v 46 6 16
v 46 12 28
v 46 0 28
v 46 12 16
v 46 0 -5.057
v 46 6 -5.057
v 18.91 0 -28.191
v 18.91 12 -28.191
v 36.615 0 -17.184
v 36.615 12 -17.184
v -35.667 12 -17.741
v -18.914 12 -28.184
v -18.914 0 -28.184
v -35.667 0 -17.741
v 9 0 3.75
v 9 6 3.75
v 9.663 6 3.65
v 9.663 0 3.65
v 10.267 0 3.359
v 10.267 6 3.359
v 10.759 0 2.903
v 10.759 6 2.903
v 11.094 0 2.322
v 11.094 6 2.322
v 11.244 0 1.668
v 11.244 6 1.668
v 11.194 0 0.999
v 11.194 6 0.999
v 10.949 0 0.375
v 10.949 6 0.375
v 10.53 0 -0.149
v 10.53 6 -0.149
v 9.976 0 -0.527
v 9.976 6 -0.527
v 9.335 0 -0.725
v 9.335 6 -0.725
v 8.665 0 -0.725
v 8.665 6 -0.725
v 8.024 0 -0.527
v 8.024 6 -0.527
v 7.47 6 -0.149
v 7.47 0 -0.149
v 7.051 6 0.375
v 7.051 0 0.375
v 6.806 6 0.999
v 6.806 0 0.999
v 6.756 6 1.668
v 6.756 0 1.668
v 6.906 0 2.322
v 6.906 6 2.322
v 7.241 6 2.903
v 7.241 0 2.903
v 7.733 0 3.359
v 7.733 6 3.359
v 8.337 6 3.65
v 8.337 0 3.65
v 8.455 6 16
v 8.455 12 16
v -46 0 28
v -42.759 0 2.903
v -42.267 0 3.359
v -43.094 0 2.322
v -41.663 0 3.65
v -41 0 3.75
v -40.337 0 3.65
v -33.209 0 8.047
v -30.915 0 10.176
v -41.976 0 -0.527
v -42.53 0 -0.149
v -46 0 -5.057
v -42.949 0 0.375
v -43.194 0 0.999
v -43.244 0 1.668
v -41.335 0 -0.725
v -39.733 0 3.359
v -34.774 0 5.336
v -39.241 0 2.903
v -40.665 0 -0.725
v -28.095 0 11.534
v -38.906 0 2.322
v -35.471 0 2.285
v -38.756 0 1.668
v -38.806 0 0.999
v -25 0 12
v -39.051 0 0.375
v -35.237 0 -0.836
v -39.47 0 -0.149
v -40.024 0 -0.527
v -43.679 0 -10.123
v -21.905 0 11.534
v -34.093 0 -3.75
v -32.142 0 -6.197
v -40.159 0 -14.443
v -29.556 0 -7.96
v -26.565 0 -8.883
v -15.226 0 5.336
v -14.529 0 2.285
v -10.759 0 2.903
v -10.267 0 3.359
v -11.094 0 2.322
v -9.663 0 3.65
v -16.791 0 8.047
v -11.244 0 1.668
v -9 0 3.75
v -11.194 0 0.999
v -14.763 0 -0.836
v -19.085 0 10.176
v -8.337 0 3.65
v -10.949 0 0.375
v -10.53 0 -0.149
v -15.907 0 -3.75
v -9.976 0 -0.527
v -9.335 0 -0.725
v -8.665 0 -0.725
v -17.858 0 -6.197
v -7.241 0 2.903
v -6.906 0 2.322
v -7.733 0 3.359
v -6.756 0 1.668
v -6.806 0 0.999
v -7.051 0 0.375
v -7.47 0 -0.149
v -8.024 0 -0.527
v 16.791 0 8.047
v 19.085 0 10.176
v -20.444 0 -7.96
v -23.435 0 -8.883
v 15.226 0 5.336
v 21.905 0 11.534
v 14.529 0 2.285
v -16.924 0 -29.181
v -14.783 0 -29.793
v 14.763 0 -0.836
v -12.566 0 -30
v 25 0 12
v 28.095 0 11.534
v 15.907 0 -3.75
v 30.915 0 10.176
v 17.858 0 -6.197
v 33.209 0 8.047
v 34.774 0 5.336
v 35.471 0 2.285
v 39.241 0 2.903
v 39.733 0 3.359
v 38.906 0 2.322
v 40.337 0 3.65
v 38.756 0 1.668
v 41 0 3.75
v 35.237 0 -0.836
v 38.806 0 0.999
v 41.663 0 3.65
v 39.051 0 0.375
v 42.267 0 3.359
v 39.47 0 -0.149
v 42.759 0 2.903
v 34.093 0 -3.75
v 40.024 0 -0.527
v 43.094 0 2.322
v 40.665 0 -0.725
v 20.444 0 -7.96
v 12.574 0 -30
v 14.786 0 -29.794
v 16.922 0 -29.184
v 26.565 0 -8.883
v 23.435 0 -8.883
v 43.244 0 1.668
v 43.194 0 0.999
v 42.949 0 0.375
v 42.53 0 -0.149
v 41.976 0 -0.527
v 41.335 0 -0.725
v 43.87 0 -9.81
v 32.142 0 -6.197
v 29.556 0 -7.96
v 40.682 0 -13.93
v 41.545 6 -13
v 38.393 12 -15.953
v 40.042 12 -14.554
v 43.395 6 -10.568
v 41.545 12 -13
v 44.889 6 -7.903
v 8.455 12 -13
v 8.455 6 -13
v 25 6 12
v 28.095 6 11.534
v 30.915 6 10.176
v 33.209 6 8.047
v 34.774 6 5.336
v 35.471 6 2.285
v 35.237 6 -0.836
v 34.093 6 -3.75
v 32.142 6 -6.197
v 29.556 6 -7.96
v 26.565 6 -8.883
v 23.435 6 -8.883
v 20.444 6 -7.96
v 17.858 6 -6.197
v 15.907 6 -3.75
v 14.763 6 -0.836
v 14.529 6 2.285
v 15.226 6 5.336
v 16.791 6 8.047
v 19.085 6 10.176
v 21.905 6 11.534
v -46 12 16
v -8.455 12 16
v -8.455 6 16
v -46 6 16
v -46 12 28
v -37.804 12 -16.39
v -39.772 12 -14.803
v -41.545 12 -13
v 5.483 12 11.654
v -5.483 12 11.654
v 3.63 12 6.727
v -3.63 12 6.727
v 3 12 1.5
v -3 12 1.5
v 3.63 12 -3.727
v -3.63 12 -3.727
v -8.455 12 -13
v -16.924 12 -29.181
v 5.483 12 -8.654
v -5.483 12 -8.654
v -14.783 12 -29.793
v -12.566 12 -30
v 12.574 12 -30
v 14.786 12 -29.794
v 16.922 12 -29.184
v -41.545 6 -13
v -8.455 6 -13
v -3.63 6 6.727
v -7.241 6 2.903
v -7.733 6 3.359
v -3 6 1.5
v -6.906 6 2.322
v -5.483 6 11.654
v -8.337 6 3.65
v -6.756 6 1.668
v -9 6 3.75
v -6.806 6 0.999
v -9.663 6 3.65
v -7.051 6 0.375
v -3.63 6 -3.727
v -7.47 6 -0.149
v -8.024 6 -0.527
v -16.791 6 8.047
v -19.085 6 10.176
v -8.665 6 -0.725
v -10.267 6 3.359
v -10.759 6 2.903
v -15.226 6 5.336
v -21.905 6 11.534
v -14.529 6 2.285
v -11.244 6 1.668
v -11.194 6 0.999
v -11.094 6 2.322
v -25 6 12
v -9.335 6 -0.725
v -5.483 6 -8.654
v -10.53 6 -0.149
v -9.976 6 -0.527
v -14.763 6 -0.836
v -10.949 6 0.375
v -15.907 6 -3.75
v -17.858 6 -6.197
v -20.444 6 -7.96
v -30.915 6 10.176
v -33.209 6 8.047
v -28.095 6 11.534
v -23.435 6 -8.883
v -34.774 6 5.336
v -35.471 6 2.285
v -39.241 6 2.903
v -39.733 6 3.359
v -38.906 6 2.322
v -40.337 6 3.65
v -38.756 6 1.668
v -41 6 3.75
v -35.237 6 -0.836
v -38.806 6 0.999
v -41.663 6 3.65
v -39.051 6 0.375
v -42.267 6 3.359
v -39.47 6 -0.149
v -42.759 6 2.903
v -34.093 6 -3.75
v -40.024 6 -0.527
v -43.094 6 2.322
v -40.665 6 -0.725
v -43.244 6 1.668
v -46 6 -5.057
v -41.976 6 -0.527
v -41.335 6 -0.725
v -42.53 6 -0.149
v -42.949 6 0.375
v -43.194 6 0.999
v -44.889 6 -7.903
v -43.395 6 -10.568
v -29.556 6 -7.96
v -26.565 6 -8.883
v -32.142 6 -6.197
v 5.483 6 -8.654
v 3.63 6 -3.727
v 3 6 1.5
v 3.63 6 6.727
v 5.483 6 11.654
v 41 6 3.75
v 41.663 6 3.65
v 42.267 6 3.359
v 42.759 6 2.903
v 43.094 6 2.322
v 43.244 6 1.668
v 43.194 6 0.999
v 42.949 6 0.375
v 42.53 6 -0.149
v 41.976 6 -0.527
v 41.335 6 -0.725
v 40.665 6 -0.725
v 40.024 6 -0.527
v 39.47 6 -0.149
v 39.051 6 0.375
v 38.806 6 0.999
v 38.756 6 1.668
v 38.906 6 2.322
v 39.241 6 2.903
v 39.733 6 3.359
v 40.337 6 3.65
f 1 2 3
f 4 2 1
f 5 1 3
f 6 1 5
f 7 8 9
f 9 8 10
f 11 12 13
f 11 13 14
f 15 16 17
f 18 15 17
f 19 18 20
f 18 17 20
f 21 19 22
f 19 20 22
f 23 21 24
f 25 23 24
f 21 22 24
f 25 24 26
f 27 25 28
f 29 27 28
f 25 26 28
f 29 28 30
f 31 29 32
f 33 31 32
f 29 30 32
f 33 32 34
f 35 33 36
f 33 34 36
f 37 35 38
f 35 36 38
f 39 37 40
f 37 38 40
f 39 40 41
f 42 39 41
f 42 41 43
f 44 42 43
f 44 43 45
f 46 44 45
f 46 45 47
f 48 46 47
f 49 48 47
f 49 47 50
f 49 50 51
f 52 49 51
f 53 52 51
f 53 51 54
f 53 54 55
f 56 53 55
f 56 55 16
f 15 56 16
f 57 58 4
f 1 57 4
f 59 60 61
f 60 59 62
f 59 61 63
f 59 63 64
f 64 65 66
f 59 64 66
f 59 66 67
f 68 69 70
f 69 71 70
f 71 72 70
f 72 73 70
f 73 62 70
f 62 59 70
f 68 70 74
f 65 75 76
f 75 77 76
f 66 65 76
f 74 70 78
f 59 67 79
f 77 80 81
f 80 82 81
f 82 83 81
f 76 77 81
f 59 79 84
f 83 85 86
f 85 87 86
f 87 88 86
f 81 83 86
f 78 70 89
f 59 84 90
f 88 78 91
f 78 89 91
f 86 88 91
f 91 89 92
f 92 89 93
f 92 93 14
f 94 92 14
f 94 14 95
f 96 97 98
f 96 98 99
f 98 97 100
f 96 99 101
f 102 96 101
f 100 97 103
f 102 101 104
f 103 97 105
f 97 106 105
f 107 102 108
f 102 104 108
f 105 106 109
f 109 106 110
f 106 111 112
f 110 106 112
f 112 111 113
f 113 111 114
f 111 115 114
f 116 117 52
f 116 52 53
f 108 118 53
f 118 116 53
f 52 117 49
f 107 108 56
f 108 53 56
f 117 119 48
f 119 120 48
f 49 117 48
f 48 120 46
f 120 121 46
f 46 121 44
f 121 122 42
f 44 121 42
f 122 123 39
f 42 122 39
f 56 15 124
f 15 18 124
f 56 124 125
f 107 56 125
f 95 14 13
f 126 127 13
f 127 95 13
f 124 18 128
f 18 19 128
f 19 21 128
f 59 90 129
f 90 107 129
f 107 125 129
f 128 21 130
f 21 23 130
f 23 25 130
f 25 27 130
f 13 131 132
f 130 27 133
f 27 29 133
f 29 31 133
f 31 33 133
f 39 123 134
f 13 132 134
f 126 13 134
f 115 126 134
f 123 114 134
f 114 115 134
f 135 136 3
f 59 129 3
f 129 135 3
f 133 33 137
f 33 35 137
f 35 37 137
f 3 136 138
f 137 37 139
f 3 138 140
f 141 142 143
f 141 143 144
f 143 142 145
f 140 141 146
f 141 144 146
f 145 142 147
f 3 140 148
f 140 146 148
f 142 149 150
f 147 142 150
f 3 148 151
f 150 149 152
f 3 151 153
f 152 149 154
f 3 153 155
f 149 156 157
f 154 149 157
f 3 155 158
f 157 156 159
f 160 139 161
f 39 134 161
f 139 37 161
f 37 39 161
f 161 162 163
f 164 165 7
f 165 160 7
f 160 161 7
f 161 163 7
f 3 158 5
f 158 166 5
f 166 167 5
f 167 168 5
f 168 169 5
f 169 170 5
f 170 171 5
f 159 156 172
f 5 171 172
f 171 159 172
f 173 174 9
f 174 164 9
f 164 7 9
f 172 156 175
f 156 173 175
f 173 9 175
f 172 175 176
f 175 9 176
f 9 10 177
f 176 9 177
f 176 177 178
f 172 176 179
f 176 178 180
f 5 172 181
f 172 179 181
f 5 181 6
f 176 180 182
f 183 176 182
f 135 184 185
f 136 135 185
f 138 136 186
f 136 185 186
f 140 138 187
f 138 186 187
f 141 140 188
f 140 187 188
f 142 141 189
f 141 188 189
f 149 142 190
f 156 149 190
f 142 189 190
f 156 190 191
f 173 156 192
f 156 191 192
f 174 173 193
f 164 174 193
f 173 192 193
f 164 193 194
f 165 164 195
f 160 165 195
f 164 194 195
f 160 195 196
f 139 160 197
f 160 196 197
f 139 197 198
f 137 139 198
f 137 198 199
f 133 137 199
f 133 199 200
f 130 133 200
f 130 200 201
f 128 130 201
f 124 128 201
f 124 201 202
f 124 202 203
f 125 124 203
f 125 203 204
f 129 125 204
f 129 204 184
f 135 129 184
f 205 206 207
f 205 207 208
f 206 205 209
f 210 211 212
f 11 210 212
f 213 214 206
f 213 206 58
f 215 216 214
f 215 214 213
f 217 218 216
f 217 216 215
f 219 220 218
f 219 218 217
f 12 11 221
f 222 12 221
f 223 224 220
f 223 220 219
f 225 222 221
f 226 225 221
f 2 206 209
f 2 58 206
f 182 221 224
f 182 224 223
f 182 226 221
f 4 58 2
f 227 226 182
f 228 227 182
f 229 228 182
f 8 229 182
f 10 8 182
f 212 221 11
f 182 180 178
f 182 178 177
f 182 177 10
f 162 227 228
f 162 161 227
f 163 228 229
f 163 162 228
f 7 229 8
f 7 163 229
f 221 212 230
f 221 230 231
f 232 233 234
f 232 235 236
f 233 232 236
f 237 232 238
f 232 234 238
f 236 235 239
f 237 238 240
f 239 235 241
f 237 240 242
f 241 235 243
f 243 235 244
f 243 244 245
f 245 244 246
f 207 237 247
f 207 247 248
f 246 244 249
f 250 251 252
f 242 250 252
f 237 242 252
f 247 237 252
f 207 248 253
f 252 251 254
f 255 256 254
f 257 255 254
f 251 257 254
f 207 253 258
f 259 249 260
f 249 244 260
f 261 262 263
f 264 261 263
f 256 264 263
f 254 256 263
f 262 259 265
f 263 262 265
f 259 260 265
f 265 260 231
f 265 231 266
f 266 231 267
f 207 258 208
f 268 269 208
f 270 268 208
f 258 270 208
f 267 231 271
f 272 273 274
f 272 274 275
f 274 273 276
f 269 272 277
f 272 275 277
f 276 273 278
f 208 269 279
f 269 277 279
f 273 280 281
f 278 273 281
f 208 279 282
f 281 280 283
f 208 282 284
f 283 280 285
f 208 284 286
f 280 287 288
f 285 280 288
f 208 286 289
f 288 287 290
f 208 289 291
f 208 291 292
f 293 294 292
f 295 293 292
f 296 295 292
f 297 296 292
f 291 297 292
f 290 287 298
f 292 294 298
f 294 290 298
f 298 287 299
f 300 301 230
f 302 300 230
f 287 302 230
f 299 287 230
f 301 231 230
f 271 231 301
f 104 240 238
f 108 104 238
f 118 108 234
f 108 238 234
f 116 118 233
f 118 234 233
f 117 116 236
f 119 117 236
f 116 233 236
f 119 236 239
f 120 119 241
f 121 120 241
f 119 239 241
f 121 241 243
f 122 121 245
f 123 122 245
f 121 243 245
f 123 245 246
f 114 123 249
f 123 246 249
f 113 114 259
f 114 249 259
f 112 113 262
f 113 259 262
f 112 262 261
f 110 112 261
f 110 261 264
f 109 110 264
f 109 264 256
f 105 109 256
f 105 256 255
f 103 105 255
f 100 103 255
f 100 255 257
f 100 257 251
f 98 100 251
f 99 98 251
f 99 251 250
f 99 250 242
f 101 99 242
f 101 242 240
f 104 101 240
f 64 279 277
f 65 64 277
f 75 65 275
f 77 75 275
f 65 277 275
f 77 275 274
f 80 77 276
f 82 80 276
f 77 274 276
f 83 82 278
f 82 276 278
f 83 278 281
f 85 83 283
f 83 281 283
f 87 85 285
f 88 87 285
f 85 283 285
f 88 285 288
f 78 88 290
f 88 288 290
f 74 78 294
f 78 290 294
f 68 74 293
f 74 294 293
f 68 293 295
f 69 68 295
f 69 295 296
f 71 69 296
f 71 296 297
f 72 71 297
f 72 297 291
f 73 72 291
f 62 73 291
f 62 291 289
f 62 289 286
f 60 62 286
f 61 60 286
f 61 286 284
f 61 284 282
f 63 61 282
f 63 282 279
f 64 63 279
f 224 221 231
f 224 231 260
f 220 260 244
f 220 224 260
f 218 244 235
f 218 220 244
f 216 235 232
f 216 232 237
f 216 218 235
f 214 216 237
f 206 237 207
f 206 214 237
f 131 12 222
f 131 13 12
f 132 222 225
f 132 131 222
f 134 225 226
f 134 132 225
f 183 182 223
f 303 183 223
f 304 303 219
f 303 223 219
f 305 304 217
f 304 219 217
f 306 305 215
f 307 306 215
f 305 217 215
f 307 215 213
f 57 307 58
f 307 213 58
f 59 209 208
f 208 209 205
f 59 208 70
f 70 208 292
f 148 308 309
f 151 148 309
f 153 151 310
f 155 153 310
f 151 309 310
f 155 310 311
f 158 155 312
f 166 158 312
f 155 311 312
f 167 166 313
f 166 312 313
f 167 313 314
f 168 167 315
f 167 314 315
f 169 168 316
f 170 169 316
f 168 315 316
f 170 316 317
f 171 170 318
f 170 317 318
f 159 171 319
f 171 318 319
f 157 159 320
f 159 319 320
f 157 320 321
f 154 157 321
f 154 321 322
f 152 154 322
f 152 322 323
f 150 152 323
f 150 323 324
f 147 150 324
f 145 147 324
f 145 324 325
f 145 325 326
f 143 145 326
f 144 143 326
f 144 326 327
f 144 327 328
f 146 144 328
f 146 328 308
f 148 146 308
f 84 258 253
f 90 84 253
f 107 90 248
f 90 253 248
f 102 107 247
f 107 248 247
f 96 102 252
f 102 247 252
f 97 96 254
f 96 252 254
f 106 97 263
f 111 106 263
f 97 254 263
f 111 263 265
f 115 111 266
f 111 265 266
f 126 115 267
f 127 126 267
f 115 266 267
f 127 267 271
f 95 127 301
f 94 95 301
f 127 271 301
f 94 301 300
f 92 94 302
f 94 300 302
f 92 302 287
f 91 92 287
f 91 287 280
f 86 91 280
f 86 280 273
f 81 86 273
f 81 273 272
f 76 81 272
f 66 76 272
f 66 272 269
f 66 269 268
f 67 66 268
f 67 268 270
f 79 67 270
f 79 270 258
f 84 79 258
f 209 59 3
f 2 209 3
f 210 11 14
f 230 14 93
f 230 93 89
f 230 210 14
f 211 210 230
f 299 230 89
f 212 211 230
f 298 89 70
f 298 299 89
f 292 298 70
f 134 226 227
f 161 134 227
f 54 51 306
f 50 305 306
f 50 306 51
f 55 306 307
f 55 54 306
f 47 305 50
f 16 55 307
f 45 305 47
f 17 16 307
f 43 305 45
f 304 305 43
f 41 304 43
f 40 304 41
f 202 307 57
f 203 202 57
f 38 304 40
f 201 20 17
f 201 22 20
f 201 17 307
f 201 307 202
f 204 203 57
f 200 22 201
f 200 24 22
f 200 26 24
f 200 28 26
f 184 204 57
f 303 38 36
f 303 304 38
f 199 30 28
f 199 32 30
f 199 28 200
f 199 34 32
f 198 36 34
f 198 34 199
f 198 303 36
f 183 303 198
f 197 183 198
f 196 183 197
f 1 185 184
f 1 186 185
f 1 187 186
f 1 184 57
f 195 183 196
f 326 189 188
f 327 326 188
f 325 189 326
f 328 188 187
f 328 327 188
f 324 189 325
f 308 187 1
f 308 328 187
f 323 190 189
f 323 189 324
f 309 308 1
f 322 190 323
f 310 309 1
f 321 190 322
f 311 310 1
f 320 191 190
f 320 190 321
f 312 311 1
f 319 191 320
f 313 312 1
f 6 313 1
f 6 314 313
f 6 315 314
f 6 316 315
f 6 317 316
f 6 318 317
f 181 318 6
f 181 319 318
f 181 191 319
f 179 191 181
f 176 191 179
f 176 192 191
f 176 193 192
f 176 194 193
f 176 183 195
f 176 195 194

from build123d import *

# Parameters (mm, degrees)
SKETCH1_W           = 92
SKETCH1_H           = 56
BOSS_EXTRUDE1_DEPTH = 12
SKETCH8_W           = 92
SKETCH8_H           = 2
BOSS_EXTRUDE3_DEPTH = 12
CUT_EXTRUDE1_REACH  = 58.214
SKETCH2_R           = 10.5
CUT_EXTRUDE3_DEPTH  = 6
CUT_EXTRUDE4_REACH  = 57.245
SKETCH6_R           = 2.25
CUT_EXTRUDE5_REACH  = 58.214
FILLET2_R           = 12


with BuildPart() as part:
    # Sketch1 → Boss-Extrude1 (new body)
    with BuildSketch(Plane(origin=(0, 0, 0), x_dir=(1, 0, 0), z_dir=(0, 1, 0))):
        Rectangle(SKETCH1_W, SKETCH1_H)
    extrude(amount=BOSS_EXTRUDE1_DEPTH)

    # Sketch8 → Boss-Extrude3 (add)
    with BuildSketch(Plane(origin=(0, 12, 0), x_dir=(1, 0, 0), z_dir=(0, 1, 0))):
        with Locations((0, 29)):
            Rectangle(SKETCH8_W, SKETCH8_H)
    extrude(amount=-BOSS_EXTRUDE3_DEPTH)

    # Sketch2 → Cut-Extrude1 (cut, up to next)
    with BuildSketch(Plane(origin=(0, 12, 0), x_dir=(1, 0, 0), z_dir=(0, 1, 0)), mode=Mode.PRIVATE) as cut_extrude1_sk1:
        with Locations(Location((-25, -1.5, 0), (0, 0, 270))):
            Circle(SKETCH2_R)
    cut_extrude1_tool1 = extrude(cut_extrude1_sk1.sketch, amount=-CUT_EXTRUDE1_REACH, mode=Mode.PRIVATE) & part.part
    # Sketch2 → Cut-Extrude1 (cut, up to next)
    with BuildSketch(Plane(origin=(0, 12, 0), x_dir=(1, 0, 0), z_dir=(0, 1, 0)), mode=Mode.PRIVATE) as cut_extrude1_sk2:
        with Locations(Location((25, -1.5, 0), (0, 0, 270))):
            Circle(SKETCH2_R)
    cut_extrude1_tool2 = extrude(cut_extrude1_sk2.sketch, amount=-CUT_EXTRUDE1_REACH, mode=Mode.PRIVATE) & part.part
    add(cut_extrude1_tool1.solids().sort_by_distance((-25, 12, 1.5))[0], mode=Mode.SUBTRACT)
    add(cut_extrude1_tool2.solids().sort_by_distance((25, 12, 1.5))[0], mode=Mode.SUBTRACT)

    # Sketch5 → Cut-Extrude3 (cut)
    with BuildSketch(Plane(origin=(0, 12, 0), x_dir=(1, 0, 0), z_dir=(0, 1, 0))):
        with BuildLine():
            Line((-46, -16), (-46, -8.057438524))
            ThreePointArc((-46, -8.057438524), (-46.523662477, 3.053235505), (-41.545392108, 13))
            Line((-41.545392108, 13), (-8.454607892, 13))
            ThreePointArc((-8.454607892, 13), (-3, -1.5), (-8.454607892, -16))
            Line((-8.454607892, -16), (-46, -16))
        make_face()
        with BuildLine():
            Line((46, -16), (46, -8.057438524))
            ThreePointArc((46, -8.057438524), (46.523662477, 3.053235505), (41.545392108, 13))
            Line((41.545392108, 13), (8.454607892, 13))
            ThreePointArc((8.454607892, 13), (3, -1.5), (8.454607892, -16))
            Line((8.454607892, -16), (46, -16))
        make_face()
    extrude(amount=-CUT_EXTRUDE3_DEPTH, mode=Mode.SUBTRACT)

    # Sketch6 → Cut-Extrude4 (cut, up to next)
    with BuildSketch(Plane(origin=(0, 6, 0), x_dir=(1, 0, 0), z_dir=(0, 1, 0)), mode=Mode.PRIVATE) as cut_extrude4_sk1:
        with Locations(Location((-41, -1.5, 0), (0, 0, 270))):
            Circle(SKETCH6_R)
    cut_extrude4_tool1 = extrude(cut_extrude4_sk1.sketch, amount=-CUT_EXTRUDE4_REACH, mode=Mode.PRIVATE) & part.part
    # Sketch6 → Cut-Extrude4 (cut, up to next)
    with BuildSketch(Plane(origin=(0, 6, 0), x_dir=(1, 0, 0), z_dir=(0, 1, 0)), mode=Mode.PRIVATE) as cut_extrude4_sk2:
        with Locations(Location((-9, -1.5, 0), (0, 0, 270))):
            Circle(SKETCH6_R)
    cut_extrude4_tool2 = extrude(cut_extrude4_sk2.sketch, amount=-CUT_EXTRUDE4_REACH, mode=Mode.PRIVATE) & part.part
    # Sketch6 → Cut-Extrude4 (cut, up to next)
    with BuildSketch(Plane(origin=(0, 6, 0), x_dir=(1, 0, 0), z_dir=(0, 1, 0)), mode=Mode.PRIVATE) as cut_extrude4_sk3:
        with Locations(Location((9, -1.5, 0), (0, 0, 270))):
            Circle(SKETCH6_R)
    cut_extrude4_tool3 = extrude(cut_extrude4_sk3.sketch, amount=-CUT_EXTRUDE4_REACH, mode=Mode.PRIVATE) & part.part
    # Sketch6 → Cut-Extrude4 (cut, up to next)
    with BuildSketch(Plane(origin=(0, 6, 0), x_dir=(1, 0, 0), z_dir=(0, 1, 0)), mode=Mode.PRIVATE) as cut_extrude4_sk4:
        with Locations(Location((41, -1.5, 0), (0, 0, 270))):
            Circle(SKETCH6_R)
    cut_extrude4_tool4 = extrude(cut_extrude4_sk4.sketch, amount=-CUT_EXTRUDE4_REACH, mode=Mode.PRIVATE) & part.part
    add(cut_extrude4_tool1.solids().sort_by_distance((-41, 6, 1.5))[0], mode=Mode.SUBTRACT)
    add(cut_extrude4_tool2.solids().sort_by_distance((-9, 6, 1.5))[0], mode=Mode.SUBTRACT)
    add(cut_extrude4_tool3.solids().sort_by_distance((9, 6, 1.5))[0], mode=Mode.SUBTRACT)
    add(cut_extrude4_tool4.solids().sort_by_distance((41, 6, 1.5))[0], mode=Mode.SUBTRACT)

    # Sketch10 → Cut-Extrude5 (cut, up to next)
    with BuildSketch(Plane(origin=(0, 12, 0), x_dir=(1, 0, 0), z_dir=(0, 1, 0)), mode=Mode.PRIVATE) as cut_extrude5_sk1:
        with BuildLine():
            Line((-46, 5.057438524), (-46, 30))
            Line((-46, 30), (-16, 30))
            Line((-16, 30), (-35.667304108, 17.740806196))
            ThreePointArc((-35.667304108, 17.740806196), (-42.056420822, 12.395269294), (-46, 5.057438524))
        make_face()
    cut_extrude5_tool1 = extrude(cut_extrude5_sk1.sketch, amount=-CUT_EXTRUDE5_REACH, mode=Mode.PRIVATE) & part.part
    # Sketch10 → Cut-Extrude5 (cut, up to next)
    with BuildSketch(Plane(origin=(0, 12, 0), x_dir=(1, 0, 0), z_dir=(0, 1, 0)), mode=Mode.PRIVATE) as cut_extrude5_sk2:
        with BuildLine():
            Line((46, 5.057438524), (46, 30))
            Line((46, 30), (16, 30))
            Line((16, 30), (36.615382461, 17.183760068))
            ThreePointArc((36.615382461, 17.183760068), (42.39835371, 11.964668142), (46, 5.057438524))
        make_face()
    cut_extrude5_tool2 = extrude(cut_extrude5_sk2.sketch, amount=-CUT_EXTRUDE5_REACH, mode=Mode.PRIVATE) & part.part
    add(cut_extrude5_tool1.solids().sort_by_distance((-36.403407, 12, -23.114901))[0], mode=Mode.SUBTRACT)
    add(cut_extrude5_tool2.solids().sort_by_distance((36.411287, 12, -23.11647))[0], mode=Mode.SUBTRACT)

    # Fillet2
    fillet2_edges = [part.edges().sort_by_distance(p)[0] for p in [
        (-16, 6, -30),
        (16, 6, -30),
    ]]
    fillet(fillet2_edges, radius=FILLET2_R)


solid = part.part
